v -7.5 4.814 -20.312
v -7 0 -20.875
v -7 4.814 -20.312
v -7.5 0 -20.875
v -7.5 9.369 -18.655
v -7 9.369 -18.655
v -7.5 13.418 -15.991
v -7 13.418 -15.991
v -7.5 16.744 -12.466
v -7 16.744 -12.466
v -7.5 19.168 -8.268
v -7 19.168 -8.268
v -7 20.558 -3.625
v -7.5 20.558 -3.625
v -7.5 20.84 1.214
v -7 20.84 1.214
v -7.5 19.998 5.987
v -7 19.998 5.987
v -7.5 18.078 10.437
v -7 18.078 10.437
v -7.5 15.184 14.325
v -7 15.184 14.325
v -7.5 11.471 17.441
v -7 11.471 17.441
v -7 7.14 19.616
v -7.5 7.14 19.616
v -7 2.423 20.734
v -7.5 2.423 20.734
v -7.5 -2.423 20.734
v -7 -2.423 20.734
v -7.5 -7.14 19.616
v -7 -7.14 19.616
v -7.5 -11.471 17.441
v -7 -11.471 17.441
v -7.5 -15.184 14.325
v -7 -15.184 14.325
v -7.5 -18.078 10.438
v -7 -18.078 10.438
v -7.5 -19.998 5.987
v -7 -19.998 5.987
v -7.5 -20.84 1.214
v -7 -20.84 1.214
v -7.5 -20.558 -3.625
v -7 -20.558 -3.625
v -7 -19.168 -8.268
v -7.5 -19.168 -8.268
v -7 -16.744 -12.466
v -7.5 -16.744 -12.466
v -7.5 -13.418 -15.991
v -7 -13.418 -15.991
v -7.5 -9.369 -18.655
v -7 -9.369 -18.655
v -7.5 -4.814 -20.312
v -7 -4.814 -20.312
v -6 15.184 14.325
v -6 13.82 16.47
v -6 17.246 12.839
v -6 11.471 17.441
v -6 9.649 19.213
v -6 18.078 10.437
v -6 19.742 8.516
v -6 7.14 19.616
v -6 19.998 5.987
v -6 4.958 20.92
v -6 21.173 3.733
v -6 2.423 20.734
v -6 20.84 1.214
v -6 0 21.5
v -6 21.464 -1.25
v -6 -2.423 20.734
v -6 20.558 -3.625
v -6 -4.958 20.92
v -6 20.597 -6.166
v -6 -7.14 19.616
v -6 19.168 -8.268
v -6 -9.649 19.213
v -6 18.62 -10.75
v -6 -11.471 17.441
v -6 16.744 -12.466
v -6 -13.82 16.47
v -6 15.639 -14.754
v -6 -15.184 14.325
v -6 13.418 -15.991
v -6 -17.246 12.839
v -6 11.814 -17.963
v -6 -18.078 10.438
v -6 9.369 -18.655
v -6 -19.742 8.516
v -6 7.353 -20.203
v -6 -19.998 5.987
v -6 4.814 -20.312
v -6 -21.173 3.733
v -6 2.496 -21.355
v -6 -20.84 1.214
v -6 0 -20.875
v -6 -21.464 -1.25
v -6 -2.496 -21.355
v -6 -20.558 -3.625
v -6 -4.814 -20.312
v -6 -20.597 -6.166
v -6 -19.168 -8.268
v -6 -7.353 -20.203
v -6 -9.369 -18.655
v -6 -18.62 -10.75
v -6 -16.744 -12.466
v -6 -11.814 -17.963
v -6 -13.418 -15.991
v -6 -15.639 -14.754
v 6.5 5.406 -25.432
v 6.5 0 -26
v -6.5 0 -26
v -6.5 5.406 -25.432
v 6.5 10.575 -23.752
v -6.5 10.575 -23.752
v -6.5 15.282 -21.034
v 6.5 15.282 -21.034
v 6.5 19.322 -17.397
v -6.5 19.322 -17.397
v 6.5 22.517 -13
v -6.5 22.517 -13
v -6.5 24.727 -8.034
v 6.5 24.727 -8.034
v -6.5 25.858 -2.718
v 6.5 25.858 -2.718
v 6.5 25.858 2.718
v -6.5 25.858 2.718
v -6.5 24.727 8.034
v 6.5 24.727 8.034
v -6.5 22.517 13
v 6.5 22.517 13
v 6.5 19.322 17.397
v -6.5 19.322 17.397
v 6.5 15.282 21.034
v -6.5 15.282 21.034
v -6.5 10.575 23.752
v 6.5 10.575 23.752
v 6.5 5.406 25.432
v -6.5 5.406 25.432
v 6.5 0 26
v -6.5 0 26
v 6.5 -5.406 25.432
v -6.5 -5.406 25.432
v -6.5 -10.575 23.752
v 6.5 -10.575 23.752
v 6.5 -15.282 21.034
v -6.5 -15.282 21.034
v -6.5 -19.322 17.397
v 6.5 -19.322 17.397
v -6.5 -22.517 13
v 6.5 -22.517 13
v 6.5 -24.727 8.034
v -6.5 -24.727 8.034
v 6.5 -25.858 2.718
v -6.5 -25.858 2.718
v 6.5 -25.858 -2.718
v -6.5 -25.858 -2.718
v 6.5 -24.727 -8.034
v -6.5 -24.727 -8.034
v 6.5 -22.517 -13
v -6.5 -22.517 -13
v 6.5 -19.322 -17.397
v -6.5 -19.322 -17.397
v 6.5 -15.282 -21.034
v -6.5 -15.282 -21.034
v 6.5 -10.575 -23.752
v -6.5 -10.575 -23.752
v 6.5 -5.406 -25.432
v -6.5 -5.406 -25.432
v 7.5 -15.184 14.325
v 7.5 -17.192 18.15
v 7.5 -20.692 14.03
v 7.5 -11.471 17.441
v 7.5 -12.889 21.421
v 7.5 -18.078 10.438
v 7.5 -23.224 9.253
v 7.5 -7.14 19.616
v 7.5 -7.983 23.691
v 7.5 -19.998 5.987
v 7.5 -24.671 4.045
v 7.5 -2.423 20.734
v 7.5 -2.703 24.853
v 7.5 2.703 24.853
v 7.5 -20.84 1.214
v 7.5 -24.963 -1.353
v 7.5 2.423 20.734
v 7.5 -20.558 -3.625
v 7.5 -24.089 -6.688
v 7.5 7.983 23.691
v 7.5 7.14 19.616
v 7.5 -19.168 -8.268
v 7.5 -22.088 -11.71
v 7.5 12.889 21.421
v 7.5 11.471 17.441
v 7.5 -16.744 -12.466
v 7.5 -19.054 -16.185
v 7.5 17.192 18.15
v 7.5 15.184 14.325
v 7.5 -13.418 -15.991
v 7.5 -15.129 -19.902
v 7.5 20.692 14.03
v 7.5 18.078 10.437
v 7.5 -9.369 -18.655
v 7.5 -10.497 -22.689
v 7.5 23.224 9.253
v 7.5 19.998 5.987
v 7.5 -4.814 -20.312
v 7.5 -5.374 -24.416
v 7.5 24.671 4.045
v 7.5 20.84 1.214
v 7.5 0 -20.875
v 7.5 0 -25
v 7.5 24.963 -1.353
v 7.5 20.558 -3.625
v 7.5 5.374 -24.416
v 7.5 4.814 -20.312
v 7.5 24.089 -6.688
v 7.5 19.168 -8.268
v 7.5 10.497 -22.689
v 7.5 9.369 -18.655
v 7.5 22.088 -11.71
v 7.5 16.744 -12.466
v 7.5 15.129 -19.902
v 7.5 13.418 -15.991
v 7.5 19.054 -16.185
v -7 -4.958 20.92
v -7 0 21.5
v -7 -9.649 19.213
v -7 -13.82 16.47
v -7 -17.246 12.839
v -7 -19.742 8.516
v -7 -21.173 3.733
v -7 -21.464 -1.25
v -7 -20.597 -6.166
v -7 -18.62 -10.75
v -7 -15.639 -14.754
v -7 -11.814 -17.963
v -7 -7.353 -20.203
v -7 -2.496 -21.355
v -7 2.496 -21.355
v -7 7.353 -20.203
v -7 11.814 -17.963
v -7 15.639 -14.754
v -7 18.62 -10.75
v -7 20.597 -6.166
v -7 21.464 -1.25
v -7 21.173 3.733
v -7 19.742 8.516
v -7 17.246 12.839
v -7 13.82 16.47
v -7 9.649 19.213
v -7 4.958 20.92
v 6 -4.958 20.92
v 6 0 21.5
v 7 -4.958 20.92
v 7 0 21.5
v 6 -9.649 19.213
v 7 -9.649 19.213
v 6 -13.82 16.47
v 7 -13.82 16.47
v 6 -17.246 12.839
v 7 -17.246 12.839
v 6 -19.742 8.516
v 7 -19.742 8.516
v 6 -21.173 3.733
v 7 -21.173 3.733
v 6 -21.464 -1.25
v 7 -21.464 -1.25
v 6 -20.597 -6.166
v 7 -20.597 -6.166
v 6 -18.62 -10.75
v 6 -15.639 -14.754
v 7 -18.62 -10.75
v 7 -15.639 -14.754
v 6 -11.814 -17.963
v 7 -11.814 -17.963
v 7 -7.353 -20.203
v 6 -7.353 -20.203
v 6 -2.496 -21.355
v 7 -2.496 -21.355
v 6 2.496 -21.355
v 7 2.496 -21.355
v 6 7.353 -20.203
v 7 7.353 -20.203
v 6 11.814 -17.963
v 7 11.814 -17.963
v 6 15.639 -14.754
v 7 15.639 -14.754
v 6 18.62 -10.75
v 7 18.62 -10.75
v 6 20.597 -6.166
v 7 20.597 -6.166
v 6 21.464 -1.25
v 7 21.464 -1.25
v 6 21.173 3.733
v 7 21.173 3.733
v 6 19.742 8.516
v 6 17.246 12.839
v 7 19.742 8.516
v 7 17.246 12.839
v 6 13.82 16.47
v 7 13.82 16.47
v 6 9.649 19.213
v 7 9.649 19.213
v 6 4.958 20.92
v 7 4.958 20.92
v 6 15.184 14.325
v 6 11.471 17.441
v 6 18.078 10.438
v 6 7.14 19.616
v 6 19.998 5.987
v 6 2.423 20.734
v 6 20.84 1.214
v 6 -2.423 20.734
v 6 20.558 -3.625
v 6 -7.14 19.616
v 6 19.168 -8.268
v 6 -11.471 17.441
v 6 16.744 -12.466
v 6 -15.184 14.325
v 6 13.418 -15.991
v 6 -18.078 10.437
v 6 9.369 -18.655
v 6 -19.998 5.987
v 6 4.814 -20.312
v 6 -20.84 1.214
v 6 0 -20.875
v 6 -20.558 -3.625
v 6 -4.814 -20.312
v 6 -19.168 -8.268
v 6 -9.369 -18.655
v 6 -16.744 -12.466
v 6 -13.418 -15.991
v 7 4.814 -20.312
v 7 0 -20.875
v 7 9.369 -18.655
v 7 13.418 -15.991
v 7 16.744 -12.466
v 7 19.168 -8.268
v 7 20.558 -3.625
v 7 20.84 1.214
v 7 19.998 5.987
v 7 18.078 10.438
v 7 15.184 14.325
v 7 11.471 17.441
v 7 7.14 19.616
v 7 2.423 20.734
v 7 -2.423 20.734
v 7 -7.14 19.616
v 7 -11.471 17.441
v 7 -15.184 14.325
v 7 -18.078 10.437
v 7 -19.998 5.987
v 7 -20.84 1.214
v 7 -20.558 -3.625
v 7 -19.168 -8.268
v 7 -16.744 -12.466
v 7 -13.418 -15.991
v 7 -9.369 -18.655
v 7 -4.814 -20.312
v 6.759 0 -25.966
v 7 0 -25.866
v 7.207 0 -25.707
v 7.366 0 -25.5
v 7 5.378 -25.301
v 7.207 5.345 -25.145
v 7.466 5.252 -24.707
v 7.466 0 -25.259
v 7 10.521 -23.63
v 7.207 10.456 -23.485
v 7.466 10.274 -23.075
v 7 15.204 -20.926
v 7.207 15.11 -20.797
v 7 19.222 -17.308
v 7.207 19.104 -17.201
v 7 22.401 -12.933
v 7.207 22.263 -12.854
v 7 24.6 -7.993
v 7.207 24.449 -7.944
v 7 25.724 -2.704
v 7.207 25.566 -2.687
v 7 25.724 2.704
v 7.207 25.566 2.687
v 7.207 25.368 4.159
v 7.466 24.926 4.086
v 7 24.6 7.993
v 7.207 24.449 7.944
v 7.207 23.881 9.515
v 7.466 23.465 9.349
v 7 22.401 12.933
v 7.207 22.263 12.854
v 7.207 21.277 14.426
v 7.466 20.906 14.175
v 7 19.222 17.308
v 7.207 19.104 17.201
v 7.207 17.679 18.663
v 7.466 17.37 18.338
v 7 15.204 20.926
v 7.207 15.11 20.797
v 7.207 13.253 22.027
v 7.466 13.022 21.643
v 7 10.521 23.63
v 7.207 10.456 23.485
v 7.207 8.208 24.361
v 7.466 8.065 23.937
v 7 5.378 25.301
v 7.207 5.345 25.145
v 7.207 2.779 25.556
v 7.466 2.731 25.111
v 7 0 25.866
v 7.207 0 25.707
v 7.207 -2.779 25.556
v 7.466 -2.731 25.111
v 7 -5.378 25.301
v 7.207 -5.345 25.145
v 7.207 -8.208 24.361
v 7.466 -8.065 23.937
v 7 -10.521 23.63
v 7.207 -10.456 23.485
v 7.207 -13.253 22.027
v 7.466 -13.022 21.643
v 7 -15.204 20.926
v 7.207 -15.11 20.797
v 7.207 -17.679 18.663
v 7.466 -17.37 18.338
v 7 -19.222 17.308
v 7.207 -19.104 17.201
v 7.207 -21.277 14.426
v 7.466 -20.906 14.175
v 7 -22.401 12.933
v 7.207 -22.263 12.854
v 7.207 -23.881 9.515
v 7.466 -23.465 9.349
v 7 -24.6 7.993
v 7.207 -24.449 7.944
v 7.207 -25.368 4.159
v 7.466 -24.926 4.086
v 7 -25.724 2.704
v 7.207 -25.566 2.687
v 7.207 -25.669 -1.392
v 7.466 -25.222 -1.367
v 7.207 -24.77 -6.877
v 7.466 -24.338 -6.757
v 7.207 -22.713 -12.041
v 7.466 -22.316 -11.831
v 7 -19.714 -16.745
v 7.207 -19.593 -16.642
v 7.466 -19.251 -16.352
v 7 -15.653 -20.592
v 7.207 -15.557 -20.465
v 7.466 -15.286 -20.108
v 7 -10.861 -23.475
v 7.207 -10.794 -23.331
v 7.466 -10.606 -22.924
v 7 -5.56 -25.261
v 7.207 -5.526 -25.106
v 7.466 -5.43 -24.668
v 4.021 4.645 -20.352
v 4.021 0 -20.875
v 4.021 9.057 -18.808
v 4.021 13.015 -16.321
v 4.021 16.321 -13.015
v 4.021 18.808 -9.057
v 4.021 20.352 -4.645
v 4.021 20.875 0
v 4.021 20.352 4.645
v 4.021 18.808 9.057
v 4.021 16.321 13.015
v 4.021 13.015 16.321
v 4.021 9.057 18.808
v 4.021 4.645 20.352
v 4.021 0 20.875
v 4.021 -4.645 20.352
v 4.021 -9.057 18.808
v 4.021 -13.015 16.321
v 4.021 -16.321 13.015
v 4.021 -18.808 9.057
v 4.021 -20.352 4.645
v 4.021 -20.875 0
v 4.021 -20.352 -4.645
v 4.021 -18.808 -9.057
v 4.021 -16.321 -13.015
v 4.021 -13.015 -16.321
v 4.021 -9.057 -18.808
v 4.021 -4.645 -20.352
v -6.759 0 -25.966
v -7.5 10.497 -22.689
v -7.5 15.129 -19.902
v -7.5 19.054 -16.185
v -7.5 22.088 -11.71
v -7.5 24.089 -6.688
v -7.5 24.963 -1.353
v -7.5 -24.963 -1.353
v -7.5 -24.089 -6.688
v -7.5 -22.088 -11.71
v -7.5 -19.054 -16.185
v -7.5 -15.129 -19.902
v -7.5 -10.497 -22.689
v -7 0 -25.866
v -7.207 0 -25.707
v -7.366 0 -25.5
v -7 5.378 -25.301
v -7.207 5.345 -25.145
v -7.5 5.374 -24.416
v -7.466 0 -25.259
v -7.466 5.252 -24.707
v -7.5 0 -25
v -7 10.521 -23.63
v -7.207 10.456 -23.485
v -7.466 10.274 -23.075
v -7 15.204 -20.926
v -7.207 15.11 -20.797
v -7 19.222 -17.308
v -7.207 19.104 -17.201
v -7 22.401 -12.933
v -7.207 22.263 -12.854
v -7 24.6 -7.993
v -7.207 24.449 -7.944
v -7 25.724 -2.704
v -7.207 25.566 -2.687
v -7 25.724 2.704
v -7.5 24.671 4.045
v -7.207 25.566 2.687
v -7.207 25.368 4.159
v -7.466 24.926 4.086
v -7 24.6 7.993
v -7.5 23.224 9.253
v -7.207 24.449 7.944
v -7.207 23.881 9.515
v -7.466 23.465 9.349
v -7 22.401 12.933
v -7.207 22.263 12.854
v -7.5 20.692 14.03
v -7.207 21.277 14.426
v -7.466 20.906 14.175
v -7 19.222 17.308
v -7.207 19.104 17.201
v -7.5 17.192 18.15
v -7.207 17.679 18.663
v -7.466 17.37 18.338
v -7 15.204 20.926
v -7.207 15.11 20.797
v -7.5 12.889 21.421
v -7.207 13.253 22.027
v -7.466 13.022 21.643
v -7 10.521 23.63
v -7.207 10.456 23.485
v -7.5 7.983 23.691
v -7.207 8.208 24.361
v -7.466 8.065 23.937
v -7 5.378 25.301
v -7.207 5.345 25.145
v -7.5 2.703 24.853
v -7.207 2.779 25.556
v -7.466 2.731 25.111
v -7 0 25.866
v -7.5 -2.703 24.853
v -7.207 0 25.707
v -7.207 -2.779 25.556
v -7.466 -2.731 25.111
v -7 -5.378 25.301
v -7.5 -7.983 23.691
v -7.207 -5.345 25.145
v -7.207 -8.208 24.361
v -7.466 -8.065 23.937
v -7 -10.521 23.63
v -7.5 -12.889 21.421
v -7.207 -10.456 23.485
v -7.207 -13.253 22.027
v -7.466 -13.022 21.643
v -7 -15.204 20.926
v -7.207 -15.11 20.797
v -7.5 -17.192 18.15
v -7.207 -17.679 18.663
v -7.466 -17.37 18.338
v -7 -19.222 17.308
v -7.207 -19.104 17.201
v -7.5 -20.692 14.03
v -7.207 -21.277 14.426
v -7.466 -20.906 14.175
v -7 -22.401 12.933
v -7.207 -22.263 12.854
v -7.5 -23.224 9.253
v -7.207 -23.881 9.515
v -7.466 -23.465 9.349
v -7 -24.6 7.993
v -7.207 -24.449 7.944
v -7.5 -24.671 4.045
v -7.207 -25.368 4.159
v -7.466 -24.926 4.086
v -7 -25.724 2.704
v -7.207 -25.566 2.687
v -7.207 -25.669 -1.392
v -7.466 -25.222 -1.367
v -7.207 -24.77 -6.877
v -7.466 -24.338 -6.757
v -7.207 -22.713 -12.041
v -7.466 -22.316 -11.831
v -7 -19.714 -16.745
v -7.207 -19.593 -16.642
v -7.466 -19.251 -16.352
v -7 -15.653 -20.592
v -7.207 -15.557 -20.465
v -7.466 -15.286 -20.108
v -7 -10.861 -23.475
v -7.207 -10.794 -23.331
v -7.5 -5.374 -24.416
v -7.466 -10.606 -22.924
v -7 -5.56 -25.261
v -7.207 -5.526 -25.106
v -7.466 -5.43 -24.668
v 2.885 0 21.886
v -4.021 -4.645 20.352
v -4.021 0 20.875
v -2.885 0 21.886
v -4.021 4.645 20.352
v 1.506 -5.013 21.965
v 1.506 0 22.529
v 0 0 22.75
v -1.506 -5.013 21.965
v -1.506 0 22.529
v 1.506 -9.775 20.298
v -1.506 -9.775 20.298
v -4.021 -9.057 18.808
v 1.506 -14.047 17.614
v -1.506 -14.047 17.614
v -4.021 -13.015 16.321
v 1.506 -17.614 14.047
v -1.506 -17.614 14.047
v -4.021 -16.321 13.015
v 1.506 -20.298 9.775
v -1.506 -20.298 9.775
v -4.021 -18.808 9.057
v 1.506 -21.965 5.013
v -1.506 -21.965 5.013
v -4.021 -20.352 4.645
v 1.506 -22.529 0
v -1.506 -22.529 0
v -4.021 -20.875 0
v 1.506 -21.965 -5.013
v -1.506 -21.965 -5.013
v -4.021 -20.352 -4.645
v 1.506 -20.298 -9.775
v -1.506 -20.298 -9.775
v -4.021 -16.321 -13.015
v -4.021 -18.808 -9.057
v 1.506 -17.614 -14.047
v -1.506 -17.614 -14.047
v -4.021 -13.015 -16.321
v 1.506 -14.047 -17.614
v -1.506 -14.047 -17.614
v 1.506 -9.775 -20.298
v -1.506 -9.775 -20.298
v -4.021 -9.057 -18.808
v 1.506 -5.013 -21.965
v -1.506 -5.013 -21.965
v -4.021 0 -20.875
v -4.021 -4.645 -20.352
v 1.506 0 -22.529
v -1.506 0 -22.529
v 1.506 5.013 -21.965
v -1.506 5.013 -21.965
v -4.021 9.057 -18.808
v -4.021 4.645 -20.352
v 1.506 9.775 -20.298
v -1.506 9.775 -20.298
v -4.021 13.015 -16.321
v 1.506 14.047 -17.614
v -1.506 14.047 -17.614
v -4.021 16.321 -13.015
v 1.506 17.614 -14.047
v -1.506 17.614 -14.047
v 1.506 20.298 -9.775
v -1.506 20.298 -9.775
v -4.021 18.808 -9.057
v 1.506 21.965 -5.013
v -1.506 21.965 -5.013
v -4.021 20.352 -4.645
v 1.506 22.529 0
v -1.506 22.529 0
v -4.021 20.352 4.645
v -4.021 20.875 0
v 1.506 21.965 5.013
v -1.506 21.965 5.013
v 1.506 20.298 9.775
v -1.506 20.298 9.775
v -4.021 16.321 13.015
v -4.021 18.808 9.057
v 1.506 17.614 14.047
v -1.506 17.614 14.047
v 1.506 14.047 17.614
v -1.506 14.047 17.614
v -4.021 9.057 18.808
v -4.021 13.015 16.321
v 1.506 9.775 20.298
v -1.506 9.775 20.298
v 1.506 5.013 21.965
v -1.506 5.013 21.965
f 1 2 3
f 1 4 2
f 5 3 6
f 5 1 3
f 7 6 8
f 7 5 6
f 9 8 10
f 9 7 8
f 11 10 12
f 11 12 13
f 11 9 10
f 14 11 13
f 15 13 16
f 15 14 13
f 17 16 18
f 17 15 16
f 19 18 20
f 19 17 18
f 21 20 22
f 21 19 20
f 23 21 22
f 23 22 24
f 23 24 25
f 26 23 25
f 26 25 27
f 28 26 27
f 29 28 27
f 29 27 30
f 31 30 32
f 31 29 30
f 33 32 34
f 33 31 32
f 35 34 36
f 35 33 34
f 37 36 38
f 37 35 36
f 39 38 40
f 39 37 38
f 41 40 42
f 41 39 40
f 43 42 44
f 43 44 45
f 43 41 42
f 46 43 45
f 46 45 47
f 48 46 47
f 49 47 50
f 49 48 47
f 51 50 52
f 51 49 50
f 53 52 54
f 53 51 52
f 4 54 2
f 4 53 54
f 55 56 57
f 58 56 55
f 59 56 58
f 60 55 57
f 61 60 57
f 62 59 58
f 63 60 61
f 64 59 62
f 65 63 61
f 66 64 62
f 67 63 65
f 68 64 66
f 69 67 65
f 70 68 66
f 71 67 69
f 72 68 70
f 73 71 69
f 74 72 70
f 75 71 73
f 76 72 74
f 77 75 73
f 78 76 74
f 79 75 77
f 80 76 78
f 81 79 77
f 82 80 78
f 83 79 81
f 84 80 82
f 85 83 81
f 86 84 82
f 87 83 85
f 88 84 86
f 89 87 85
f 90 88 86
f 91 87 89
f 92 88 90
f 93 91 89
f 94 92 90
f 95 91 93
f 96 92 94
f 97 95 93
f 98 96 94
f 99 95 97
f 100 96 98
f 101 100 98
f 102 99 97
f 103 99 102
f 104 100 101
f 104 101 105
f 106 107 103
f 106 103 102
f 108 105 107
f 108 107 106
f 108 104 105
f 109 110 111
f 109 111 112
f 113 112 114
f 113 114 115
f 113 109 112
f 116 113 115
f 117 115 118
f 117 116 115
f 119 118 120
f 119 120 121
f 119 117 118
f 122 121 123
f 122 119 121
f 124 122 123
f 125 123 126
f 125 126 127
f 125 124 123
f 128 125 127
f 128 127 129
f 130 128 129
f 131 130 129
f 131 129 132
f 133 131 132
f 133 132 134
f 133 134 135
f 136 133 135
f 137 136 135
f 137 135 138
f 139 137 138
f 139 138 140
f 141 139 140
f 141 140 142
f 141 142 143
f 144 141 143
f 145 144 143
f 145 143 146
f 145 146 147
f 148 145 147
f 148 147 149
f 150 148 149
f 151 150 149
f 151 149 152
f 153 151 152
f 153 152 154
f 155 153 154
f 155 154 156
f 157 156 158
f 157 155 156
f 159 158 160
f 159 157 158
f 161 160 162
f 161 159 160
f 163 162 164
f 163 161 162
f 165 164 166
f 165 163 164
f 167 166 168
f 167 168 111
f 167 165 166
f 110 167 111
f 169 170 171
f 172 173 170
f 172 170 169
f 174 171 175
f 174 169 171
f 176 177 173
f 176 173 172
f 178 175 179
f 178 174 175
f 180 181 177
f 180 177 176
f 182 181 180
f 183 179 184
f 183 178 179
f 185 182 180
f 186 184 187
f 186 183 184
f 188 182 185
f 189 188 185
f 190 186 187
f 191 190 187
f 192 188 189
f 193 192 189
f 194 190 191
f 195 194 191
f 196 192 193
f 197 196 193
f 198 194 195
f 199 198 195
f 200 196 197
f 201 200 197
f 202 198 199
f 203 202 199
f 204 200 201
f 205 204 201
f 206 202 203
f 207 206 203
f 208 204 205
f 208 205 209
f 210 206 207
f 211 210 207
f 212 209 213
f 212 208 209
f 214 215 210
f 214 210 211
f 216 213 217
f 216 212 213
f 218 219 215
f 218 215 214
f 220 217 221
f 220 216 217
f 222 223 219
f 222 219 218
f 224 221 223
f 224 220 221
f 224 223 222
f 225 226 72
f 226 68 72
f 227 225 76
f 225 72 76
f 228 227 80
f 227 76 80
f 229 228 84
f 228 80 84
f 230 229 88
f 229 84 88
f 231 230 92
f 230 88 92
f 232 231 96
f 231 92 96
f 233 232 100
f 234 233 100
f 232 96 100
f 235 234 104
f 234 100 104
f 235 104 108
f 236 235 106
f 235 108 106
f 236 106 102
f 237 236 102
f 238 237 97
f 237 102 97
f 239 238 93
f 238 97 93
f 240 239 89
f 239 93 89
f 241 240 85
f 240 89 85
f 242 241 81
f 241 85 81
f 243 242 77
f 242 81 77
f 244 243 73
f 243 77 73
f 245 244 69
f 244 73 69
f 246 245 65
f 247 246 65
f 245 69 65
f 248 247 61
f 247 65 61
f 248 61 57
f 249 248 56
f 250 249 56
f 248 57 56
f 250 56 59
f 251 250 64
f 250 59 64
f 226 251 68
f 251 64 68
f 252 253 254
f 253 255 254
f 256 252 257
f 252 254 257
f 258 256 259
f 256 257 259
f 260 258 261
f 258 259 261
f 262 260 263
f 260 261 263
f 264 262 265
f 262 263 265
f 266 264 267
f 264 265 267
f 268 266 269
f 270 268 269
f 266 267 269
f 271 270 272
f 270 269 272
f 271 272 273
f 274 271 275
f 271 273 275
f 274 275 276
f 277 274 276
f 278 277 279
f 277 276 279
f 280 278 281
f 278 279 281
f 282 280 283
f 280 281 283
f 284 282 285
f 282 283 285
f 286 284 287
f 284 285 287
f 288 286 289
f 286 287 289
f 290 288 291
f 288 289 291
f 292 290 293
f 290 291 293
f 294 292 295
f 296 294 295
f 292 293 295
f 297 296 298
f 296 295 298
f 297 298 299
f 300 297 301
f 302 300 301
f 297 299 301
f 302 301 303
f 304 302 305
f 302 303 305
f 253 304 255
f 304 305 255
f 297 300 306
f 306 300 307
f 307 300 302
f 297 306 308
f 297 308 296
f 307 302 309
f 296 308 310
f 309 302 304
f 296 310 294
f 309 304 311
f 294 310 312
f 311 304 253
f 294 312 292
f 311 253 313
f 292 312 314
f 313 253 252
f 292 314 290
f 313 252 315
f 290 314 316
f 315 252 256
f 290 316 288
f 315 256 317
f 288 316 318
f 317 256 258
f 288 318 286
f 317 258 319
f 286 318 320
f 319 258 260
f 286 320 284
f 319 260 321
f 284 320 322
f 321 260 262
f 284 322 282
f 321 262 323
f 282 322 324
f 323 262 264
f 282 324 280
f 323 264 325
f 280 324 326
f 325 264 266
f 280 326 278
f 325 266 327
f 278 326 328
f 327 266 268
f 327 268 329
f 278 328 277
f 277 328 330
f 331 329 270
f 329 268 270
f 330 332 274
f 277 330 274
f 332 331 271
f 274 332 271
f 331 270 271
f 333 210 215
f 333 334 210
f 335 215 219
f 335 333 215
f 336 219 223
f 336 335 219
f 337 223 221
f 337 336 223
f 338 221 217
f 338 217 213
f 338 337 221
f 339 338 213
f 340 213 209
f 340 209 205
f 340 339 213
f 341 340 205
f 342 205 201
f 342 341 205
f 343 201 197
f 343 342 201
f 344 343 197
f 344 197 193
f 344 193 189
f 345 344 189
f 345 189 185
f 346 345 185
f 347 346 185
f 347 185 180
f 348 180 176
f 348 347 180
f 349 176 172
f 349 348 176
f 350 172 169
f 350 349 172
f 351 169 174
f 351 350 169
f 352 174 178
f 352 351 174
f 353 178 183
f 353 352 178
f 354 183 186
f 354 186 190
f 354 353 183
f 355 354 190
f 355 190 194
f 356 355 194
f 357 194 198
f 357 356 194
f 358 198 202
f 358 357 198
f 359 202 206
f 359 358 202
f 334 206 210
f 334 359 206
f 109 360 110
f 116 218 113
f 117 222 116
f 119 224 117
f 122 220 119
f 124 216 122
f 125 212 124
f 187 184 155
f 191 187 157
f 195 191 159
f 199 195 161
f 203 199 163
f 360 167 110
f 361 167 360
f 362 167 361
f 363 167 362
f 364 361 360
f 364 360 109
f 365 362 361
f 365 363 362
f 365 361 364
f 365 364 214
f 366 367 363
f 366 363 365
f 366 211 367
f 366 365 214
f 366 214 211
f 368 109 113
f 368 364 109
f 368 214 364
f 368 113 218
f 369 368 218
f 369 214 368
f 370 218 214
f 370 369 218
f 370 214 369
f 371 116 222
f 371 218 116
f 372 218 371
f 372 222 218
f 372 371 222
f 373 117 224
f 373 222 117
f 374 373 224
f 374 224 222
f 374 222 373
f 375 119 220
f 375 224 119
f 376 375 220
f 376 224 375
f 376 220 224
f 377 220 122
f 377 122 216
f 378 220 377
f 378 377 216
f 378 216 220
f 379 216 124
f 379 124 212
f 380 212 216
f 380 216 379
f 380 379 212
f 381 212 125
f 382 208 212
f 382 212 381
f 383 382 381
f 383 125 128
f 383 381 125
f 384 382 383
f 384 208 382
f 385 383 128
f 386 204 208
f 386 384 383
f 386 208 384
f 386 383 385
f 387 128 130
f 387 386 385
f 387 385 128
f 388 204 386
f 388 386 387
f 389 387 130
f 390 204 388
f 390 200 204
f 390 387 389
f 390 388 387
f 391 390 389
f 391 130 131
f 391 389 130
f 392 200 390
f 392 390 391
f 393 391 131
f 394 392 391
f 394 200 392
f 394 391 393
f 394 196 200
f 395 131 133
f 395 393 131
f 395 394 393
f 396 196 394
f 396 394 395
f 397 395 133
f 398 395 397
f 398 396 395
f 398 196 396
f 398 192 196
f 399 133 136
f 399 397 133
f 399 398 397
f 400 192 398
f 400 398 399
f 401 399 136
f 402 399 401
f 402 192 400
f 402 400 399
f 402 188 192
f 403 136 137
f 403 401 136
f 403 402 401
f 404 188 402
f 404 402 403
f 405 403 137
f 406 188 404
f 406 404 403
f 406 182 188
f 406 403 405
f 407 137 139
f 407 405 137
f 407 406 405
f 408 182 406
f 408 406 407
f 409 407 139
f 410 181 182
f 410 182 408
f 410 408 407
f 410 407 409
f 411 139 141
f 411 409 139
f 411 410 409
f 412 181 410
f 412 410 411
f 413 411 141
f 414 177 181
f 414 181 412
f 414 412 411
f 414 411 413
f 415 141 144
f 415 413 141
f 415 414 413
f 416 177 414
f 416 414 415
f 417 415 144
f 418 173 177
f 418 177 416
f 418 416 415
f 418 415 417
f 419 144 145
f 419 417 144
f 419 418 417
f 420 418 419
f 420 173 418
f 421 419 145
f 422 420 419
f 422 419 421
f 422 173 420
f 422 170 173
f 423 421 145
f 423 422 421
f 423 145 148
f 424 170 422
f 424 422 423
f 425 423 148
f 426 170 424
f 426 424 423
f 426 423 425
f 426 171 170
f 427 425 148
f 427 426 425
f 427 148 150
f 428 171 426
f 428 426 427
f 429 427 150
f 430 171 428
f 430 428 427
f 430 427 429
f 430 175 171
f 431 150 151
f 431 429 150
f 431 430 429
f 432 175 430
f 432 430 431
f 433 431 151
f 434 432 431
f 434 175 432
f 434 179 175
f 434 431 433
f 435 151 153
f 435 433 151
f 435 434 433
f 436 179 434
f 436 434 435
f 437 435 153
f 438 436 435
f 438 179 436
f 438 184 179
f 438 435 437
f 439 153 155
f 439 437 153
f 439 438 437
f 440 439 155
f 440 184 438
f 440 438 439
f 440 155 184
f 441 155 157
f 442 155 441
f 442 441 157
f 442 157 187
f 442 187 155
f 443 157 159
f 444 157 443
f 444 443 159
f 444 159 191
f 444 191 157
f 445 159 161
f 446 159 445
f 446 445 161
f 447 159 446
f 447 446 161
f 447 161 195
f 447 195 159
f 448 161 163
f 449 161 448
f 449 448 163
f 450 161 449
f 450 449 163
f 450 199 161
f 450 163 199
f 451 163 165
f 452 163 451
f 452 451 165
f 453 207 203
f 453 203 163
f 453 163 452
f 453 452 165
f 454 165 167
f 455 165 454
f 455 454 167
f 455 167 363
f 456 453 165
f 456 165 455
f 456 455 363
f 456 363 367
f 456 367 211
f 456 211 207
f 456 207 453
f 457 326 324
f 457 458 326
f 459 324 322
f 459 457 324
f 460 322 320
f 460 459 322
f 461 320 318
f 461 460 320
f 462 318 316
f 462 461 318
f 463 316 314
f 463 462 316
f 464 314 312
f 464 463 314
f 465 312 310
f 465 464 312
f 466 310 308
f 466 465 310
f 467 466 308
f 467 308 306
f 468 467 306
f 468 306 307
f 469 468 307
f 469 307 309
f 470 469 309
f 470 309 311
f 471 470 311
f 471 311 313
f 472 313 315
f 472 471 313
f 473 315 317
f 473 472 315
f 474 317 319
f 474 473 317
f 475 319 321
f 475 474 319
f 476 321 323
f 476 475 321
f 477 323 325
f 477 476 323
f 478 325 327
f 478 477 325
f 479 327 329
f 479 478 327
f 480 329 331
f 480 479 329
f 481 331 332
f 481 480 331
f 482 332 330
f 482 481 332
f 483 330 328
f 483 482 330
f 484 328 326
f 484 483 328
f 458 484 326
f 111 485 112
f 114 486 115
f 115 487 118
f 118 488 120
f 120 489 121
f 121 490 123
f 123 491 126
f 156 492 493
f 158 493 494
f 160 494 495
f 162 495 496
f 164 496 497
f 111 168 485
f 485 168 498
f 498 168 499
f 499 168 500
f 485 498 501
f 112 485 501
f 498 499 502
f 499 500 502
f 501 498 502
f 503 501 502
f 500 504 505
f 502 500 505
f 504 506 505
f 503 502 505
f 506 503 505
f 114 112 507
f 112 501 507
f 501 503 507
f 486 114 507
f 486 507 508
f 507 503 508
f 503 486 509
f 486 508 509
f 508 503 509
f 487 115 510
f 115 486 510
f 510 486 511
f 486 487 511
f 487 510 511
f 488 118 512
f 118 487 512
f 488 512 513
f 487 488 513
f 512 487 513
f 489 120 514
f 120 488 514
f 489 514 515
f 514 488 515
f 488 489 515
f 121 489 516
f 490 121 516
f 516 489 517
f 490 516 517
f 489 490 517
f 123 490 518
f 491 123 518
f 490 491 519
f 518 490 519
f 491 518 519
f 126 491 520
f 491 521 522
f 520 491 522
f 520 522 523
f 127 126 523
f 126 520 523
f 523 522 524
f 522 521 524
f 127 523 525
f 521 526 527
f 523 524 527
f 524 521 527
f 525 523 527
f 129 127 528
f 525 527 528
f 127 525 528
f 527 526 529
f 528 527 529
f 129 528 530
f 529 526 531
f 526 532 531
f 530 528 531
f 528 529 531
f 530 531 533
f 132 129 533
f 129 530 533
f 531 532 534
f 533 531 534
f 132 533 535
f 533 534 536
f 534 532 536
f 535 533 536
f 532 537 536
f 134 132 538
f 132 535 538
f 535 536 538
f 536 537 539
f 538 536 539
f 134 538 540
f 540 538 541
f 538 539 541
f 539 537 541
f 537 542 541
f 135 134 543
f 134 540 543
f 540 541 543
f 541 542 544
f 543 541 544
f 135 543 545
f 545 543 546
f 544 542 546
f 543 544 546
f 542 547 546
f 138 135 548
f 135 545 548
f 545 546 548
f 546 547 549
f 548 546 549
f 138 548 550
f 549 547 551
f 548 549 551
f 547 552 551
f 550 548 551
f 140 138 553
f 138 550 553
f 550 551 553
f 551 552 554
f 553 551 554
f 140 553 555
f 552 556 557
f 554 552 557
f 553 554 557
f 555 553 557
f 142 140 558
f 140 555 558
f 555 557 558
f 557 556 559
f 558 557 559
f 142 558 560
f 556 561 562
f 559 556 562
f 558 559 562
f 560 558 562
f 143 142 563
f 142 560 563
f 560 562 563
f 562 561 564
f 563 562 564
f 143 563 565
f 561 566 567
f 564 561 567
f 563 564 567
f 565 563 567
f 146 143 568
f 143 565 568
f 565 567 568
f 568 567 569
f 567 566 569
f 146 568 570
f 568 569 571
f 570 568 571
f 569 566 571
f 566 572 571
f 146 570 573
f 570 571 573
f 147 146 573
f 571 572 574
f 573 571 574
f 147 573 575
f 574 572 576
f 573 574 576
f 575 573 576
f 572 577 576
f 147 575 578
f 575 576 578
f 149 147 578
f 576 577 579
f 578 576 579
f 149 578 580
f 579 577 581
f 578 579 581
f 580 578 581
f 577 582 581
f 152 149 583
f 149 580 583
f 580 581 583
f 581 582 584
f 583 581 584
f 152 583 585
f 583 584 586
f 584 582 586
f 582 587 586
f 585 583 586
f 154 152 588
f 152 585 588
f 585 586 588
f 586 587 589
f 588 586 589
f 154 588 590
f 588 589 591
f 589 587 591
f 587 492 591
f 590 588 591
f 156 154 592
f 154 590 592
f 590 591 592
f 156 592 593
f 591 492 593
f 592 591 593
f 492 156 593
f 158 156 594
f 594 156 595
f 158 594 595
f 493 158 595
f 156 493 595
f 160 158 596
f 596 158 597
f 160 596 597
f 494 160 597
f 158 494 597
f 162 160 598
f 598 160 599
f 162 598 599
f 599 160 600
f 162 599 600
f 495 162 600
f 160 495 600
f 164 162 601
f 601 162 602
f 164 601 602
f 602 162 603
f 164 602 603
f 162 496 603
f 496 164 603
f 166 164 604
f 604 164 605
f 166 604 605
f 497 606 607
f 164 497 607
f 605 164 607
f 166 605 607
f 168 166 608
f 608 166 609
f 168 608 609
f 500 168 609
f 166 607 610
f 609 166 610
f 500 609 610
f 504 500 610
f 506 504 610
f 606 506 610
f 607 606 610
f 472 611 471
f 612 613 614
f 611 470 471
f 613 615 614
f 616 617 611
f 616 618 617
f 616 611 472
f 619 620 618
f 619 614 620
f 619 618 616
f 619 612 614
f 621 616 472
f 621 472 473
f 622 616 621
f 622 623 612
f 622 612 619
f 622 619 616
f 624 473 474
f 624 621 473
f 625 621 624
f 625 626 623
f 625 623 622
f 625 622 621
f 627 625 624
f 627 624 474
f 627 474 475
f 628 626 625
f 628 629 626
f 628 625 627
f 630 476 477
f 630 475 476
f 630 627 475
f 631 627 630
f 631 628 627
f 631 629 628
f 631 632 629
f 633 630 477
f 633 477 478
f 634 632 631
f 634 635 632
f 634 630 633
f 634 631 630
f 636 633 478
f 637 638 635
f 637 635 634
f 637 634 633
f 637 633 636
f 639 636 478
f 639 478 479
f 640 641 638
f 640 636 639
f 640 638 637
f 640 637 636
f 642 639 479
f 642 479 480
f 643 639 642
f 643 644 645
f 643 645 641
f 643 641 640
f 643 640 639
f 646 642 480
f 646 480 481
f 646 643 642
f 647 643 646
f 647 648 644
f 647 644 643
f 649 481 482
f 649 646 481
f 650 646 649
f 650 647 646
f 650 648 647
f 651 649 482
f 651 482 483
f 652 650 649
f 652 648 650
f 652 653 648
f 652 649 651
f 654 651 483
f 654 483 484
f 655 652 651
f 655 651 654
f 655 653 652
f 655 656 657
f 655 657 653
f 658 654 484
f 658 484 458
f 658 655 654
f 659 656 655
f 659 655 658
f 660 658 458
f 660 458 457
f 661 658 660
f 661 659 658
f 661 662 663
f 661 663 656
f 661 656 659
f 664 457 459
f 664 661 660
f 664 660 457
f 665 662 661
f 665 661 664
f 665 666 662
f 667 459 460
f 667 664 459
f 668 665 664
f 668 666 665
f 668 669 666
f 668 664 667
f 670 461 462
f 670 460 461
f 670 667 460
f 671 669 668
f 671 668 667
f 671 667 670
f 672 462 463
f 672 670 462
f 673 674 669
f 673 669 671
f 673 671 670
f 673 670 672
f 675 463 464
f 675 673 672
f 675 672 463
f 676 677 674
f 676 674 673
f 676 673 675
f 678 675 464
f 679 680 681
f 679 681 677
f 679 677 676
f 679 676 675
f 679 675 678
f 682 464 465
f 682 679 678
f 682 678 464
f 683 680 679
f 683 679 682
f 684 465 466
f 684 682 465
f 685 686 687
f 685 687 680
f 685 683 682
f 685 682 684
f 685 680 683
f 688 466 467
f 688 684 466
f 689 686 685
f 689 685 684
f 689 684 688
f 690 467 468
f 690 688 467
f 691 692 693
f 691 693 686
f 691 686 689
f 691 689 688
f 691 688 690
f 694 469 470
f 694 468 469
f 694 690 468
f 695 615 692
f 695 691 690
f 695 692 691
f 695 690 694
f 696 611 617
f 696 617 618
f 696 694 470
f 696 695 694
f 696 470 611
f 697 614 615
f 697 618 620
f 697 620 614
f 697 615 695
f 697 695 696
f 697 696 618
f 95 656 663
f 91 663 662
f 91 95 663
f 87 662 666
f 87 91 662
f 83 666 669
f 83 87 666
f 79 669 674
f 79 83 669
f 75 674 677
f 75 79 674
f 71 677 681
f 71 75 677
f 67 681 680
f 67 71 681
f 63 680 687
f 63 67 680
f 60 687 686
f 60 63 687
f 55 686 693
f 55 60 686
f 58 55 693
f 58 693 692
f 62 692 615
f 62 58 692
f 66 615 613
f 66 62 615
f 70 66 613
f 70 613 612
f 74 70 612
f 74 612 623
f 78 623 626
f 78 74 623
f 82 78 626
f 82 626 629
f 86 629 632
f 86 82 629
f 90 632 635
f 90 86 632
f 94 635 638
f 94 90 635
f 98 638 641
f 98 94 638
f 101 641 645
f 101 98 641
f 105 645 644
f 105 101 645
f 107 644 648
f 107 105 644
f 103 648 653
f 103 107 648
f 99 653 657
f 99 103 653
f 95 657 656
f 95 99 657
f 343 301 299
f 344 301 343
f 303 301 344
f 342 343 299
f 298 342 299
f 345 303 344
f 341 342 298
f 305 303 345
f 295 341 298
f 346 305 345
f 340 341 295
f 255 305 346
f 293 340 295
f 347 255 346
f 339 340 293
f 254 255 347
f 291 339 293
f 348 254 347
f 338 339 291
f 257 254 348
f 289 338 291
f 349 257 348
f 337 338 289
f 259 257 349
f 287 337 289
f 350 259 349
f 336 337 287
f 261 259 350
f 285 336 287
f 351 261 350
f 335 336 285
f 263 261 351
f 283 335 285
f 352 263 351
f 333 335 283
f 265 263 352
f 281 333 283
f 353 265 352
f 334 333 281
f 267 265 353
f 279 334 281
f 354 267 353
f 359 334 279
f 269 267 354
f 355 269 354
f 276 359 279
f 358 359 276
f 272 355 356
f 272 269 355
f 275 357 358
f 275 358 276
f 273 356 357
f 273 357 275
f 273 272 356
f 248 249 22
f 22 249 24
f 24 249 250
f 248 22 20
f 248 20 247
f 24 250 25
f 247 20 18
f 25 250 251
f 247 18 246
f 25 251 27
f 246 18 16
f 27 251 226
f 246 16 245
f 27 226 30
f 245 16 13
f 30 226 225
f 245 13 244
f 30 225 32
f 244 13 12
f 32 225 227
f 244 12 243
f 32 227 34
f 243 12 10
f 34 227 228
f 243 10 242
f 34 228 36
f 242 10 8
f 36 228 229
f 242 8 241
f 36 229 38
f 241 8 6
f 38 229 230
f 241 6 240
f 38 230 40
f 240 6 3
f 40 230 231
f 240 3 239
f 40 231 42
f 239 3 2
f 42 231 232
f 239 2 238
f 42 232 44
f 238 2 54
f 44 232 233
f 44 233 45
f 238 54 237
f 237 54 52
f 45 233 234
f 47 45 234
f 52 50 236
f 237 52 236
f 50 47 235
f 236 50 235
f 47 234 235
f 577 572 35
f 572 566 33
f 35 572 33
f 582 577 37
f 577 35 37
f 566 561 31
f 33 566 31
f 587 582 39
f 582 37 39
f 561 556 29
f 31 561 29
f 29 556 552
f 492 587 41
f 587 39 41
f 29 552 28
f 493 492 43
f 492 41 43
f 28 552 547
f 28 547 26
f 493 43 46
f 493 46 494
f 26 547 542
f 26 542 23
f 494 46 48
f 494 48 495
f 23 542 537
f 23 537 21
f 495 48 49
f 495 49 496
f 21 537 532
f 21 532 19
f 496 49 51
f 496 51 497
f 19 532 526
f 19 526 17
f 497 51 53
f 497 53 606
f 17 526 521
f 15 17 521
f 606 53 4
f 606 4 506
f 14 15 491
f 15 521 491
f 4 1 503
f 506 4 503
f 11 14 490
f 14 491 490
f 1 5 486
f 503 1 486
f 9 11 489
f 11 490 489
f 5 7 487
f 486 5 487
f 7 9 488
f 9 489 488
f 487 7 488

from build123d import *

# Parameters (mm, degrees)
SKETCH1_R           = 26
SKETCH1_R_2         = 20.875
BOSS_EXTRUDE1_DEPTH = 7.5
SKETCH2_R           = 5.25
SKETCH3_W           = 1
SKETCH3_H           = 0.625
FILLET1_R           = 1


with BuildPart() as part:
    # Sketch1 → Boss-Extrude1 (new, symmetric)
    with BuildSketch(Plane(origin=(0, 0, 0), x_dir=(0, 0, -1), z_dir=(1, 0, 0))):
        Circle(SKETCH1_R)
        Circle(SKETCH1_R_2, mode=Mode.SUBTRACT)
    extrude(amount=BOSS_EXTRUDE1_DEPTH, both=True)

    # Sketch2 → Cut-Revolve1 (revolve, cut)
    with BuildSketch(Plane.XY, mode=Mode.PRIVATE) as cut_revolve1_sk:
        with Locations((0, 17.5)):
            Circle(SKETCH2_R)
    revolve(cut_revolve1_sk.sketch.rotate(Axis((0, 0, 0), (1, 0, 0)), 90), axis=Axis((0, 0, 0), (1, 0, 0)), mode=Mode.SUBTRACT)

    # Sketch3 → Cut-Revolve2 (revolve, cut)
    with BuildSketch(Plane.XY, mode=Mode.PRIVATE) as cut_revolve2_sk:
        with Locations((-6.5, 21.1875)):
            Rectangle(SKETCH3_W, SKETCH3_H)
        with Locations((6.5, 21.1875)):
            Rectangle(SKETCH3_W, SKETCH3_H)
    revolve(cut_revolve2_sk.sketch.rotate(Axis((0, 0, 0), (1, 0, 0)), 90), axis=Axis((0, 0, 0), (1, 0, 0)), mode=Mode.SUBTRACT)

    # Fillet1
    fillet1_edges = [part.edges().sort_by_distance(p)[0] for p in [
        (-7.5, 0, 26),
        (7.5, 0, 26),
    ]]
    fillet(fillet1_edges, radius=FILLET1_R)


solid = part.part
